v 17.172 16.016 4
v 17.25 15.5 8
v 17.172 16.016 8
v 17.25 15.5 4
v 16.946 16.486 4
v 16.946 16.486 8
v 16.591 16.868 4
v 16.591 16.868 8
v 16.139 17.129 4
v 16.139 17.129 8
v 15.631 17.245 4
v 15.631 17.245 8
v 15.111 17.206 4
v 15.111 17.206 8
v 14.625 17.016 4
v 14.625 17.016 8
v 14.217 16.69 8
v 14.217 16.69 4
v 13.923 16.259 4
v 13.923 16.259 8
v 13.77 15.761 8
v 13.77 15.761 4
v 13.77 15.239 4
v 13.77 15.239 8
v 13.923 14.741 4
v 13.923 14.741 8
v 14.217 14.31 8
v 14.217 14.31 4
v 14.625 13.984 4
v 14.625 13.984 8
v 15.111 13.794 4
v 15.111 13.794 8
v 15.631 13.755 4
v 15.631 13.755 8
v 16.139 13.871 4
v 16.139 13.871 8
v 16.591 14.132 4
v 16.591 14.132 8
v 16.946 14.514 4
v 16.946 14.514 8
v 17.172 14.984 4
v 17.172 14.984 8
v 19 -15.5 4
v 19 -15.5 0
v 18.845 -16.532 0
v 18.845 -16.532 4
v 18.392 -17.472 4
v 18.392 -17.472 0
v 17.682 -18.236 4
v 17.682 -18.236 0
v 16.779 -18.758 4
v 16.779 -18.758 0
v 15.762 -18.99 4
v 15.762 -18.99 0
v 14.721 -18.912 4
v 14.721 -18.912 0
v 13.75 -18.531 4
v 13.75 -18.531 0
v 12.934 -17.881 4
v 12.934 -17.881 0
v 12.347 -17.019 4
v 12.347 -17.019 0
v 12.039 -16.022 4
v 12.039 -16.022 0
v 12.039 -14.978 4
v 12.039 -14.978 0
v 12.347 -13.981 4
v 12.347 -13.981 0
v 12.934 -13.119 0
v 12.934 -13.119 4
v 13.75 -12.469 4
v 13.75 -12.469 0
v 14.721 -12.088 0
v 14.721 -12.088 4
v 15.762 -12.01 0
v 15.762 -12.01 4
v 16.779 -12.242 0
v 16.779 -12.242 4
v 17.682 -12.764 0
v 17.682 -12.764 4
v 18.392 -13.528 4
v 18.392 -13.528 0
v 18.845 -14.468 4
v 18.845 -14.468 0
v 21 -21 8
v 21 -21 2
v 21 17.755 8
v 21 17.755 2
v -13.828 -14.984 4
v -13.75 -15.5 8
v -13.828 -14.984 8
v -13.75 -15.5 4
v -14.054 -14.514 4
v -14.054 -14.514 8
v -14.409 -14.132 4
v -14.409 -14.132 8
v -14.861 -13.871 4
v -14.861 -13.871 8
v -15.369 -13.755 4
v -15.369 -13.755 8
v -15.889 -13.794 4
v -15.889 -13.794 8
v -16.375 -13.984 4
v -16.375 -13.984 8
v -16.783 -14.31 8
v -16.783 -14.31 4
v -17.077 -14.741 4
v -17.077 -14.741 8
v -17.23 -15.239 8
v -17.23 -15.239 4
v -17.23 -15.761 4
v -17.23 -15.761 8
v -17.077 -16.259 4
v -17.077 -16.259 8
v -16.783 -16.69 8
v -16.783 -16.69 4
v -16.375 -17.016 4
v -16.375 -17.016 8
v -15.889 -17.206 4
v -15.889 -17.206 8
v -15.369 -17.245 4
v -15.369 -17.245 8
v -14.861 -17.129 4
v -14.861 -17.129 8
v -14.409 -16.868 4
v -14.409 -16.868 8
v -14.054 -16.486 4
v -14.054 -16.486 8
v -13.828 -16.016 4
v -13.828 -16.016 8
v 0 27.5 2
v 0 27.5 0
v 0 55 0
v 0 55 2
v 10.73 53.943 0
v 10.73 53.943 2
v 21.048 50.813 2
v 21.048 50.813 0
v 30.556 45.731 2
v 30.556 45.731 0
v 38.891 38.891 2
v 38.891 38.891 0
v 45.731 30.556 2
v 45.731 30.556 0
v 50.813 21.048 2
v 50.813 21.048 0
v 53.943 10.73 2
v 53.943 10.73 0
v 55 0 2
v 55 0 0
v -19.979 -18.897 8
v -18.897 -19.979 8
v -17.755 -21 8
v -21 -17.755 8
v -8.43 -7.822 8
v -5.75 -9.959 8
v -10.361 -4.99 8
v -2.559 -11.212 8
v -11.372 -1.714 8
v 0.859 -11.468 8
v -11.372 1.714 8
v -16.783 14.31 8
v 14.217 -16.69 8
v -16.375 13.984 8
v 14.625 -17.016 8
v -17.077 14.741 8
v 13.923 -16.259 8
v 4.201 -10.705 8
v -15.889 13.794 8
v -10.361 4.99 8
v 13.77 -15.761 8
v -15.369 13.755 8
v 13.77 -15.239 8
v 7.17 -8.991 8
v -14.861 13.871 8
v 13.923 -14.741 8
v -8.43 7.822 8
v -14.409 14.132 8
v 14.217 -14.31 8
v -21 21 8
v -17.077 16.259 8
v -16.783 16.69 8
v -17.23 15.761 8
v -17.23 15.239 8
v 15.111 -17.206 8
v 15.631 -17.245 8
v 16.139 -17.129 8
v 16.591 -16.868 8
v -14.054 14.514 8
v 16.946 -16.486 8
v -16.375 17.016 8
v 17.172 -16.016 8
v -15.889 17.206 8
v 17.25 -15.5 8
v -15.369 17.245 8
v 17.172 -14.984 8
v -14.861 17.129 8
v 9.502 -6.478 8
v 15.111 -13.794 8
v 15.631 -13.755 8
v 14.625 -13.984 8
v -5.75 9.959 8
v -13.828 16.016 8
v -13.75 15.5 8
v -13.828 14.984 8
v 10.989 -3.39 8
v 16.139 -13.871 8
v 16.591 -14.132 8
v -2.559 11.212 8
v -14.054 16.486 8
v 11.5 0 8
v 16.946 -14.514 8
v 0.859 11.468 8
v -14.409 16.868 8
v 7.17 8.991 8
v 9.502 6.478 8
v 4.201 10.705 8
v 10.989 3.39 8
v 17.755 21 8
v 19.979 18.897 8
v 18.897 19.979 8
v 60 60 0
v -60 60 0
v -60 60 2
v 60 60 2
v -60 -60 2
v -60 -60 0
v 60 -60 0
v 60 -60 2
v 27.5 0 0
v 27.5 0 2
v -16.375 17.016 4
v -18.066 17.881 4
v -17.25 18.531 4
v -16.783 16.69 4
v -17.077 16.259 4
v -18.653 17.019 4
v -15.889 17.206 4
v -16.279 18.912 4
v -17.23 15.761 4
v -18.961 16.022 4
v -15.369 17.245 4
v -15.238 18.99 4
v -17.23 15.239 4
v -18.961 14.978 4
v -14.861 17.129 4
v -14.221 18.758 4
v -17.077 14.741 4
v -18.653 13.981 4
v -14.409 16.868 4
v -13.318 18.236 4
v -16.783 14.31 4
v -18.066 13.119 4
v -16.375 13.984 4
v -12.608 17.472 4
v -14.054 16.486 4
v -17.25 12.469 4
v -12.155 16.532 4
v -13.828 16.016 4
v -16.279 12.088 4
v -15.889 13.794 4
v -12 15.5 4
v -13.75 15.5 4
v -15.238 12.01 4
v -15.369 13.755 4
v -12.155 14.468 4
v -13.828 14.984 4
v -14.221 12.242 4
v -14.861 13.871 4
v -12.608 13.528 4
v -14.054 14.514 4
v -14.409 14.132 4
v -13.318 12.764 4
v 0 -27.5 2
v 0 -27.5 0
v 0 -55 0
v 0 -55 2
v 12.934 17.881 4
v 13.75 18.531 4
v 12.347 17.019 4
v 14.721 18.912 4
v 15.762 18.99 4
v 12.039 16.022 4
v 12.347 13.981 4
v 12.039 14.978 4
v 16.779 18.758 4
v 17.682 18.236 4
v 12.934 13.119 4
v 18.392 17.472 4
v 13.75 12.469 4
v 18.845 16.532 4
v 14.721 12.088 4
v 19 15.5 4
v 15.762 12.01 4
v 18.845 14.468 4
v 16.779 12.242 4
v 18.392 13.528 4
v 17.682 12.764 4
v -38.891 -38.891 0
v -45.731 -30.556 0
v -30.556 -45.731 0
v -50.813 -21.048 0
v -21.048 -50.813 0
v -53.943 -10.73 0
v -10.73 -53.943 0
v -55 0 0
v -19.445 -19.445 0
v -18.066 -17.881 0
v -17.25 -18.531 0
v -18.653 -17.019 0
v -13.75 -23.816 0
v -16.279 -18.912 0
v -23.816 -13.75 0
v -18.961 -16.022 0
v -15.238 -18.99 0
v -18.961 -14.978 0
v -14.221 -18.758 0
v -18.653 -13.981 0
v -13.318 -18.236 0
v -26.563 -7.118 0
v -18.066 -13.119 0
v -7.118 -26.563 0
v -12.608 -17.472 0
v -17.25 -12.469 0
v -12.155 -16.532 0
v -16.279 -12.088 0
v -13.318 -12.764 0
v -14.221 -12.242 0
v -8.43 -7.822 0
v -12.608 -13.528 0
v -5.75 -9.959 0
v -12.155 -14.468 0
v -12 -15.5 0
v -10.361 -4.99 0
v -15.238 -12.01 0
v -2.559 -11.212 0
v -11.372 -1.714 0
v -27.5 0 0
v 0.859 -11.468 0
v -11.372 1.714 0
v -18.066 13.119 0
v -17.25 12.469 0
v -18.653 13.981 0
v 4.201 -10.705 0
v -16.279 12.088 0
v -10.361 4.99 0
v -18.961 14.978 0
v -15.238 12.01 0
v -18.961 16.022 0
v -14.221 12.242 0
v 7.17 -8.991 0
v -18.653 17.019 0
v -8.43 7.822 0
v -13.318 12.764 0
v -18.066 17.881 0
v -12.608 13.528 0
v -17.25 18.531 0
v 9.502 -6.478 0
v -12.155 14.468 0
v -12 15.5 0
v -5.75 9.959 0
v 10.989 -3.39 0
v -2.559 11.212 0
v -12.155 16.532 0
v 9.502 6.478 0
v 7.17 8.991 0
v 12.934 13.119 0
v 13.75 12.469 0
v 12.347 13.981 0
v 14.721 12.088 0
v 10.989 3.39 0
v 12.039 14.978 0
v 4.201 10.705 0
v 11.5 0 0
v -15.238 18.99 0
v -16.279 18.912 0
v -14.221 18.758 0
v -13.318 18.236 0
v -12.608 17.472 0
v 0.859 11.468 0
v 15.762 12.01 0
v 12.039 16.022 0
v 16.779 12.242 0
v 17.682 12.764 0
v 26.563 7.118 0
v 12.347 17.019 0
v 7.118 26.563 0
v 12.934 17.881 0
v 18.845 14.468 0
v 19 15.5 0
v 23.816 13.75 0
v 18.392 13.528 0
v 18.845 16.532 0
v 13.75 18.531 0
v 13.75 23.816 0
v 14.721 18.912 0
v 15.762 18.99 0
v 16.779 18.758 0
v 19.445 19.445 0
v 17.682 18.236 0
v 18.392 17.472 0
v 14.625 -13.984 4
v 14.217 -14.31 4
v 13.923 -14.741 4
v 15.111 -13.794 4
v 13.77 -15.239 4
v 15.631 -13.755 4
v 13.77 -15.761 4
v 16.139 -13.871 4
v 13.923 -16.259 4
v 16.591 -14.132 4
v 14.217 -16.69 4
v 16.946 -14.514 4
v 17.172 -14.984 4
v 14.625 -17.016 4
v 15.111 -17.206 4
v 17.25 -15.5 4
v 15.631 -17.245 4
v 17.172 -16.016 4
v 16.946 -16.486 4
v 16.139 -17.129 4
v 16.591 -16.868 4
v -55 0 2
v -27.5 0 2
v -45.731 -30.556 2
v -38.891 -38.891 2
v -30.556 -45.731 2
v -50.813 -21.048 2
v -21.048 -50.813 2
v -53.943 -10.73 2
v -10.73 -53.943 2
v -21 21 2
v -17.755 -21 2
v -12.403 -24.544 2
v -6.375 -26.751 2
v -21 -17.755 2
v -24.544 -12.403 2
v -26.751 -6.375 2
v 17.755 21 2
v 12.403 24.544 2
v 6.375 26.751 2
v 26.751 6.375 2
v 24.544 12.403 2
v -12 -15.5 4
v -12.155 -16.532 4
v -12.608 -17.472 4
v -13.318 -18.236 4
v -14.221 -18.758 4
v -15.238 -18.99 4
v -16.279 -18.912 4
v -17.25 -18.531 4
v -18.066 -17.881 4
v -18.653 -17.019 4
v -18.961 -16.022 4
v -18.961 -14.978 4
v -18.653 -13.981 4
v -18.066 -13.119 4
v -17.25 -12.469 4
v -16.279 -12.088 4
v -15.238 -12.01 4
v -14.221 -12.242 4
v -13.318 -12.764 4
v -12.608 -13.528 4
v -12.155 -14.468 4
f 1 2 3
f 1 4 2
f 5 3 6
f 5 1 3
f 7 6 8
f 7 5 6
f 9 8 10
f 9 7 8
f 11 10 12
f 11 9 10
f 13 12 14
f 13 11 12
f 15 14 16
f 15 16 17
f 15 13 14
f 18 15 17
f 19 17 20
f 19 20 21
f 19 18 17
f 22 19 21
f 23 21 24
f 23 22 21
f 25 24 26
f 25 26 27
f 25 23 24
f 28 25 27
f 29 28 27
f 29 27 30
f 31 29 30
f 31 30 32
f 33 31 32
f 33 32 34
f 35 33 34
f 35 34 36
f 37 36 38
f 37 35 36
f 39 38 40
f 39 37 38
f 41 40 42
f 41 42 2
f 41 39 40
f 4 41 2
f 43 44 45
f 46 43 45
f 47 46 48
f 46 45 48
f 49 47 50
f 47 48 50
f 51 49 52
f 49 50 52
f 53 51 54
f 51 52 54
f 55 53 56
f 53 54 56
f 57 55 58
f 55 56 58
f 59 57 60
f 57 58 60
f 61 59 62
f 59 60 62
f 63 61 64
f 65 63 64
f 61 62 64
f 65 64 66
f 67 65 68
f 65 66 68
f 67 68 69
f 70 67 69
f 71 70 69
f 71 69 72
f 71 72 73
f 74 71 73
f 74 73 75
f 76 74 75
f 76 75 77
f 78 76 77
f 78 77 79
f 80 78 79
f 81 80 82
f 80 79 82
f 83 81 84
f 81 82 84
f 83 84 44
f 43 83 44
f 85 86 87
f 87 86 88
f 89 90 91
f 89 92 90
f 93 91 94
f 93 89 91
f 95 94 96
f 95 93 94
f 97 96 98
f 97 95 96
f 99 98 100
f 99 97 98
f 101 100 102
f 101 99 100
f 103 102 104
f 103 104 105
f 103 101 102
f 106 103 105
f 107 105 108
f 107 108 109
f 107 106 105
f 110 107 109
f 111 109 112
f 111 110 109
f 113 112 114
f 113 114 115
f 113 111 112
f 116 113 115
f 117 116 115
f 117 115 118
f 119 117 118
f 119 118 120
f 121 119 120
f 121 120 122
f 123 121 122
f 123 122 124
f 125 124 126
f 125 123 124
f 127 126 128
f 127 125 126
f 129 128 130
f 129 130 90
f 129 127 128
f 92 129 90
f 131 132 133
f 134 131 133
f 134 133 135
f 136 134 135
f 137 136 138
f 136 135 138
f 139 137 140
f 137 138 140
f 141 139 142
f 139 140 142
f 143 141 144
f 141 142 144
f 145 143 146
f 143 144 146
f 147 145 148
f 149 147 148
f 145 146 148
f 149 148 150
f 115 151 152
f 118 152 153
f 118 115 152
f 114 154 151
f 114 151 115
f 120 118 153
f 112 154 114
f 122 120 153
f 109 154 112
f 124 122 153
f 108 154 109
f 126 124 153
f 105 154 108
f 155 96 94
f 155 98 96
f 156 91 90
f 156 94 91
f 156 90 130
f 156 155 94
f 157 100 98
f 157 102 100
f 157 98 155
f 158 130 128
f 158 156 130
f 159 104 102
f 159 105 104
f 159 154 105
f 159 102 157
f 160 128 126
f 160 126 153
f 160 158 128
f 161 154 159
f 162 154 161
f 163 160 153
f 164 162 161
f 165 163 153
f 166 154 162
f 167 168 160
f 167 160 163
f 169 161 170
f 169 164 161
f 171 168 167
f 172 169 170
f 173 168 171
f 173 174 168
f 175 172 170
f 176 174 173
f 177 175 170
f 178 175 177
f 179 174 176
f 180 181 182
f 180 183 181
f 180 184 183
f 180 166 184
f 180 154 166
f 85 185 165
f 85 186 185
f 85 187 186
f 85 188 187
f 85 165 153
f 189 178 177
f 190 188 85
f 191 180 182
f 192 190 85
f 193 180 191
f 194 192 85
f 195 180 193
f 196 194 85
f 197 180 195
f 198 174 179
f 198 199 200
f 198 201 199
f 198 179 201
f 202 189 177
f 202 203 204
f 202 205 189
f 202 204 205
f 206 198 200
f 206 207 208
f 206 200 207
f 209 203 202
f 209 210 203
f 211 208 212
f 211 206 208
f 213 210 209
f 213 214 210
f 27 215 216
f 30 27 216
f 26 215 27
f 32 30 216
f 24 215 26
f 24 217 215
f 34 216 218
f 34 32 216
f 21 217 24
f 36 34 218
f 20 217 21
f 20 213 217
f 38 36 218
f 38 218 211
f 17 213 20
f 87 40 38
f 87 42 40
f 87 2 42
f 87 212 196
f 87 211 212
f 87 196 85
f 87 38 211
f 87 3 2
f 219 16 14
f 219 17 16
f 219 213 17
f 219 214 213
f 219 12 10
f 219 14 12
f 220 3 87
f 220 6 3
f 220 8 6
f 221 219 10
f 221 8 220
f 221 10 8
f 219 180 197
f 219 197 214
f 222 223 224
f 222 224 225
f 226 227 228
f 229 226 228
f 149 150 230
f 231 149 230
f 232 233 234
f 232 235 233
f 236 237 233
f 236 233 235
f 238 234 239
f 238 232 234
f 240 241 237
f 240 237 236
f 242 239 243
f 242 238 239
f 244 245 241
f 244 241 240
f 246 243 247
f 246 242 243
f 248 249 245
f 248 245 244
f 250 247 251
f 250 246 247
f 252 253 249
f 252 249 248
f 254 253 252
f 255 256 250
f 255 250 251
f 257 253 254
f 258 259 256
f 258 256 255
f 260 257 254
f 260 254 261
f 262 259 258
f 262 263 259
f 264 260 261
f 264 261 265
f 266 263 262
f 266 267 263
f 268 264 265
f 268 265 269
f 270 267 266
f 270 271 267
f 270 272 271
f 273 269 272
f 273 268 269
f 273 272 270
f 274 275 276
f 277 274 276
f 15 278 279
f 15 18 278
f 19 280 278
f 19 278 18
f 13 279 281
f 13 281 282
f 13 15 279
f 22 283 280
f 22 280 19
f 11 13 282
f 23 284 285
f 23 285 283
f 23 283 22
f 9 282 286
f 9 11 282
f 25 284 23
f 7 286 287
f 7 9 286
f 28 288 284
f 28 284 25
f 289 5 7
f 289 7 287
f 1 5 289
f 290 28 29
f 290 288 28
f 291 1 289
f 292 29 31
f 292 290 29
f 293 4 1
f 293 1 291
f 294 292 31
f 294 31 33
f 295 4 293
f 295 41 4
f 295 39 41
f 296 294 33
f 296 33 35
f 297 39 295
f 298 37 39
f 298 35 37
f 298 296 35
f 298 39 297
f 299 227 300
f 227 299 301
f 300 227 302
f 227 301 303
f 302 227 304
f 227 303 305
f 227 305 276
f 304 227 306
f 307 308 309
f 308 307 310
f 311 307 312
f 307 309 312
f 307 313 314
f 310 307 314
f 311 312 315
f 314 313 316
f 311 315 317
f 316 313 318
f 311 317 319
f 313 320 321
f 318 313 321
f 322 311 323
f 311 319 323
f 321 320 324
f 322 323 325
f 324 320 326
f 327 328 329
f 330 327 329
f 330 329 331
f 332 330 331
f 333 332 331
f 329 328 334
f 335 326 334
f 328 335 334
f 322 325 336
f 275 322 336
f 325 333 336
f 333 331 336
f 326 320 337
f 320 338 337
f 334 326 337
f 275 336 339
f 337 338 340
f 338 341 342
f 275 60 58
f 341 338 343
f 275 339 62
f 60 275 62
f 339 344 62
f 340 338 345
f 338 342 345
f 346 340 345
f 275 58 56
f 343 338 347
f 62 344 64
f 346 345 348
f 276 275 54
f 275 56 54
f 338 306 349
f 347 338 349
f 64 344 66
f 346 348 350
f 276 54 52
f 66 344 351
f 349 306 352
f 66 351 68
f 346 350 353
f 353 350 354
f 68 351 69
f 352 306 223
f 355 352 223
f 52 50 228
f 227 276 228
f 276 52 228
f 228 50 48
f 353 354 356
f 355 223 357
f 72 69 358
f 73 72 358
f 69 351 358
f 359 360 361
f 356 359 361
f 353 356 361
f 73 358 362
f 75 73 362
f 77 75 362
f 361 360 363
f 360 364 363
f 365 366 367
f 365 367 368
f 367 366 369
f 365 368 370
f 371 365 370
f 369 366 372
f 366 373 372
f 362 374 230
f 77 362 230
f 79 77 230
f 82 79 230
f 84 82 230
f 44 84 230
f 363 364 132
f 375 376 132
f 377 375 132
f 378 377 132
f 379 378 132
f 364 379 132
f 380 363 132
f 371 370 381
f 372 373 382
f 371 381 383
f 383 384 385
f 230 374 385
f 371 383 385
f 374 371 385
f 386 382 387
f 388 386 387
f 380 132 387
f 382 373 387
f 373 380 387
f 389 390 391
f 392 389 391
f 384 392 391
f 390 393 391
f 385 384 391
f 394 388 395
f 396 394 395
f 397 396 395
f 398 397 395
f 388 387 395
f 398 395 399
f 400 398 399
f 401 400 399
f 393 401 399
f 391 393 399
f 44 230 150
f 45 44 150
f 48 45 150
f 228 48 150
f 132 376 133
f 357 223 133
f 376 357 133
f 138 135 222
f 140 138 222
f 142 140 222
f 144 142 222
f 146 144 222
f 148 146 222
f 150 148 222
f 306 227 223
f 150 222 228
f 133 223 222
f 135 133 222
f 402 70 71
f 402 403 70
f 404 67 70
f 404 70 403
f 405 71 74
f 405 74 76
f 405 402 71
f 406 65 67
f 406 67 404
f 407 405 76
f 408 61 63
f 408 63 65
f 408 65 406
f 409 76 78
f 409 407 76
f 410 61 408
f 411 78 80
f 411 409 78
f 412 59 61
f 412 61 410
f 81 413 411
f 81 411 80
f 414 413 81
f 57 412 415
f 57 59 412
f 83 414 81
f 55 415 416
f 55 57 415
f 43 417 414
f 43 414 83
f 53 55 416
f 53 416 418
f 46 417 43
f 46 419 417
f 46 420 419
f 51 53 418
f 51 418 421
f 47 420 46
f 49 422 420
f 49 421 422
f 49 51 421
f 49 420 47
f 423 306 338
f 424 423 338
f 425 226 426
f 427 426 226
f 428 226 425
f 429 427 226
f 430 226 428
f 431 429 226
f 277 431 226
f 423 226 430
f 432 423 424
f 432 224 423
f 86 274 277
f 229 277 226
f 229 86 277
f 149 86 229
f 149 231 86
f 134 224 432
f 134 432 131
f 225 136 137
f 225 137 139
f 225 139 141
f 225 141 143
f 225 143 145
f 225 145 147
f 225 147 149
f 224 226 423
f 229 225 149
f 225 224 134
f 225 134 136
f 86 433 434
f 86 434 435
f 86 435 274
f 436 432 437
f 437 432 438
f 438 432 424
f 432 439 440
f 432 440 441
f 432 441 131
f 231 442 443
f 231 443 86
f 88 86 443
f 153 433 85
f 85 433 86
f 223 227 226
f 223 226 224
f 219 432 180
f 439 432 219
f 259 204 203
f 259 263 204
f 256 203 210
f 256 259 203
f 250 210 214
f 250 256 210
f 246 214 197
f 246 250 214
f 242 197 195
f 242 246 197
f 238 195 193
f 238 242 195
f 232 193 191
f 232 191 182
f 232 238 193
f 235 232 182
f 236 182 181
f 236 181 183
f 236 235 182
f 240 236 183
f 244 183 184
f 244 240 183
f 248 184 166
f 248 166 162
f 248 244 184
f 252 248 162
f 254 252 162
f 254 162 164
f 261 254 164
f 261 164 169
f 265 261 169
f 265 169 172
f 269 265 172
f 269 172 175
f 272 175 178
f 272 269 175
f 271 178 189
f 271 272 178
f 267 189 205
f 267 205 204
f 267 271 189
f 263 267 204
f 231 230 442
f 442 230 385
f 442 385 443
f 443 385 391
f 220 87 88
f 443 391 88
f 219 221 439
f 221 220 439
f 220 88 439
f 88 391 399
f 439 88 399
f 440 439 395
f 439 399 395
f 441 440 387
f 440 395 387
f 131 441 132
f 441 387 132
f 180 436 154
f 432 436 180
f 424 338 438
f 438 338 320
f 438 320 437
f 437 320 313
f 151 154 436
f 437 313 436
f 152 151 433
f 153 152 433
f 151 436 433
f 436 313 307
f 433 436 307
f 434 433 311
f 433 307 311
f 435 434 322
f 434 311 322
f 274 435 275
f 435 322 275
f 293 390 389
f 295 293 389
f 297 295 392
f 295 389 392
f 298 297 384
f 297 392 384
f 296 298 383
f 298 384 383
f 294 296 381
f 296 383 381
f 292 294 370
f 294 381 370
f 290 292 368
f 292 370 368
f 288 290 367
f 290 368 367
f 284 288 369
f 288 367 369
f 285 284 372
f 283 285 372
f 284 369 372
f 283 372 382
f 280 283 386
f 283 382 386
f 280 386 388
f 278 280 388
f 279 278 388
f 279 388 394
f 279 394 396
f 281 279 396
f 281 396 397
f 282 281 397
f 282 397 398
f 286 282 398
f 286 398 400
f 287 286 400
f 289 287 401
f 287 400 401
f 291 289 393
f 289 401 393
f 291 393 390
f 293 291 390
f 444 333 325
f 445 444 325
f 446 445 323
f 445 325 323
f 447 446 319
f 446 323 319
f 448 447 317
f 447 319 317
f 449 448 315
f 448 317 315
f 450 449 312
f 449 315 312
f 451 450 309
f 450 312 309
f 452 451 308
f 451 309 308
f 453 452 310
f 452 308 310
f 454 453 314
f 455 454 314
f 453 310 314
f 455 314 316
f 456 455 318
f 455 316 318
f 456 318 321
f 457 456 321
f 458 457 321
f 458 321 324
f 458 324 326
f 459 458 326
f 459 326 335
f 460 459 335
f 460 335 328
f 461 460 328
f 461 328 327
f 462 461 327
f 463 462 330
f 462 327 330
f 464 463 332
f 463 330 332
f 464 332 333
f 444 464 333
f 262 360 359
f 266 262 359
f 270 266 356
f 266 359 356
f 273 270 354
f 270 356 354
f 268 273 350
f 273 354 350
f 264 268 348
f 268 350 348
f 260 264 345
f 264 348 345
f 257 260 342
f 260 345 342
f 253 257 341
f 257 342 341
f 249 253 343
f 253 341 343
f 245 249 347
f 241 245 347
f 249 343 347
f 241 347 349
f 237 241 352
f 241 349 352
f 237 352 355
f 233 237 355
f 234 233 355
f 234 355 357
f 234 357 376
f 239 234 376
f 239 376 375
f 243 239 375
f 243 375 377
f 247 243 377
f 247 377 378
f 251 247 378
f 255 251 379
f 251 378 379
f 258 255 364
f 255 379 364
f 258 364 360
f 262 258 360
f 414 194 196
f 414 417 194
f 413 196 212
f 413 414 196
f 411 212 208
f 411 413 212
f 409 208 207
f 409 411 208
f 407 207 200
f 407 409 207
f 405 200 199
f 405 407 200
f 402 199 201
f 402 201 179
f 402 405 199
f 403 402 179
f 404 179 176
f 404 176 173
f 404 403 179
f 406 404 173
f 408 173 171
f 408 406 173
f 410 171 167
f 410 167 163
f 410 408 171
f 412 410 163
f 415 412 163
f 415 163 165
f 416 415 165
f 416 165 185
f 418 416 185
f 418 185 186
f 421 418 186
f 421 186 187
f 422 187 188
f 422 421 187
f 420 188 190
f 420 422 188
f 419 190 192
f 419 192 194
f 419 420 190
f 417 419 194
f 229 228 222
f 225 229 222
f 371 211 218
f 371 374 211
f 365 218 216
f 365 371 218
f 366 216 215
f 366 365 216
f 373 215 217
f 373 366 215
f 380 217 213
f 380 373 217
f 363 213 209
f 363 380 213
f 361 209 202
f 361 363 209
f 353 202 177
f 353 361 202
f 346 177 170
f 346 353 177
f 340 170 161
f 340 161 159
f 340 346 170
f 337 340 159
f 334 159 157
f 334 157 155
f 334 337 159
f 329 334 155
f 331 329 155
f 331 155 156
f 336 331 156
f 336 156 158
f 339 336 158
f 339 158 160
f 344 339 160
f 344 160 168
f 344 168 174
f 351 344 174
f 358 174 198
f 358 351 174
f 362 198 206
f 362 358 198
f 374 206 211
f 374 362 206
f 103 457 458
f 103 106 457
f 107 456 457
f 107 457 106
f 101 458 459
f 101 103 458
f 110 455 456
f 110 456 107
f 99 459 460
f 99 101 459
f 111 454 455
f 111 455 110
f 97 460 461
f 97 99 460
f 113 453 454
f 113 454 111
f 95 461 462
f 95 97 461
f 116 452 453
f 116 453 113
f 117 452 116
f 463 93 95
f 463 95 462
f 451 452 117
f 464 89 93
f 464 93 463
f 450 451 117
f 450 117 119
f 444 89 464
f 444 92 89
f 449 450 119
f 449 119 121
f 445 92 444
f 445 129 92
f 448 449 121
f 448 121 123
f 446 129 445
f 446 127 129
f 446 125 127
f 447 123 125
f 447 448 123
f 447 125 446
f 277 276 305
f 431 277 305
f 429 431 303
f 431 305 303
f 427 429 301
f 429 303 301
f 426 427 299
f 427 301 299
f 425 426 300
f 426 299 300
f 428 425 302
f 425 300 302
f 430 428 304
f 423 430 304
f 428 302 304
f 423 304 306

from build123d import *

# Parameters (mm, degrees)
F0_W      = 42
F0_H      = 42
F0_R      = 1.75
F0_R_2    = 11.5
F1_DEPTH  = 5
F0_W_2    = 120
F0_H_2    = 120
F2_DEPTH  = 2
F4_DEPTH  = 2
F5_DEPTH  = 3
F6_R      = 3.5
F6_R_2    = 1.75
F7_DEPTH  = 4
F8_R      = 3.5
F8_R_2    = 1.75
F9_DEPTH  = 4
F10_R     = 3.5
F10_R_2   = 1.75
F11_DEPTH = 4
F12_DEPTH = 3
F14_DEPTH = 2
F15_DEPTH = 8


with BuildPart() as f1:
    # F0 (on Top) → F1 (new body)
    with BuildSketch(Plane.XY):
        Rectangle(F0_W, F0_H)
        with Locations((-15.5, -15.5)):
            Circle(F0_R, mode=Mode.SUBTRACT)
        with Locations((15.5, -15.5)):
            Circle(F0_R, mode=Mode.SUBTRACT)
        with Locations((-15.5, 15.5)):
            Circle(F0_R, mode=Mode.SUBTRACT)
        Circle(F0_R_2, mode=Mode.SUBTRACT)
        with Locations((15.5, 15.5)):
            Circle(F0_R, mode=Mode.SUBTRACT)
    extrude(amount=F1_DEPTH)

    # F0 (on Top) → F2 (join)
    with BuildSketch(Plane.XY):
        Rectangle(F0_W_2, F0_H_2)
        Rectangle(F0_W, F0_H, mode=Mode.SUBTRACT)
    extrude(amount=F2_DEPTH)

    # F3 (on face) → F4 (cut)
    with BuildSketch(Plane(origin=(0, 0, 0), x_dir=(1, 0, 0), z_dir=(0, 0, -1))):
        with BuildLine():
            Line((0, 27.5), (0, 55))
            ThreePointArc((0, 55), (-38.8908729653, 38.8908729653), (-55, 0))
            Line((-55, 0), (-27.5, 0))
            ThreePointArc((-27.5, 0), (-19.4454364826, 19.4454364826), (0, 27.5))
        make_face()
    extrude(amount=-F4_DEPTH, mode=Mode.SUBTRACT)

    # F5 (cut): a face of the model
    f5_faces = [f1.faces().sort_by_distance(p)[0] for p in [
        (-19.9487472991, -19.9487472991, 2),
    ]]
    extrude(f5_faces, amount=-F5_DEPTH, mode=Mode.SUBTRACT)

    # F6 (on face) → F7 (cut)
    with BuildSketch(Plane(origin=(0, 0, 0), x_dir=(1, 0, 0), z_dir=(0, 0, -1))):
        with Locations((-15.5, 15.5)):
            Circle(F6_R)
        with Locations((-15.5, 15.5)):
            Circle(F6_R_2, mode=Mode.SUBTRACT)
    extrude(amount=-F7_DEPTH, mode=Mode.SUBTRACT)

    # F8 (on face) → F9 (cut)
    with BuildSketch(Plane(origin=(0, 0, 0), x_dir=(1, 0, 0), z_dir=(0, 0, -1))):
        with Locations((15.5, 15.5)):
            Circle(F8_R)
        with Locations((15.5, 15.5)):
            Circle(F8_R_2, mode=Mode.SUBTRACT)
    extrude(amount=-F9_DEPTH, mode=Mode.SUBTRACT)

    # F10 (on face) → F11 (cut)
    with BuildSketch(Plane(origin=(0, 0, 0), x_dir=(1, 0, 0), z_dir=(0, 0, -1))):
        with Locations((-15.5, -15.5)):
            Circle(F10_R)
        with Locations((-15.5, -15.5)):
            Circle(F10_R_2, mode=Mode.SUBTRACT)
        with Locations((15.5, -15.5)):
            Circle(F10_R)
        with Locations((15.5, -15.5)):
            Circle(F10_R_2, mode=Mode.SUBTRACT)
    extrude(amount=-F11_DEPTH, mode=Mode.SUBTRACT)

    # F12 (add): a face of the model
    f12_faces = [f1.faces().sort_by_distance(p)[0] for p in [
        (1.6223595477, -20.4060303038, 5),
    ]]
    extrude(f12_faces, amount=F12_DEPTH)

    # F13 (on face) → F14 (cut)
    with BuildSketch(Plane(origin=(0, 0, 0), x_dir=(1, 0, 0), z_dir=(0, 0, -1))):
        with BuildLine():
            ThreePointArc((0, -55), (38.8908729653, -38.8908729653), (55, 0))
            Line((55, 0), (27.5, 0))
            ThreePointArc((27.5, 0), (19.4454364826, -19.4454364826), (0, -27.5))
            Line((0, -27.5), (0, -55))
        make_face()
    extrude(amount=-F14_DEPTH, mode=Mode.SUBTRACT)

    # F15 (cut): a face of the model
    f15_faces = [f1.faces().sort_by_distance(p)[0] for p in [
        (19.9487472991, 19.9487472991, 2),
    ]]
    extrude(f15_faces, amount=-F15_DEPTH, mode=Mode.SUBTRACT)


solid = f1.part
